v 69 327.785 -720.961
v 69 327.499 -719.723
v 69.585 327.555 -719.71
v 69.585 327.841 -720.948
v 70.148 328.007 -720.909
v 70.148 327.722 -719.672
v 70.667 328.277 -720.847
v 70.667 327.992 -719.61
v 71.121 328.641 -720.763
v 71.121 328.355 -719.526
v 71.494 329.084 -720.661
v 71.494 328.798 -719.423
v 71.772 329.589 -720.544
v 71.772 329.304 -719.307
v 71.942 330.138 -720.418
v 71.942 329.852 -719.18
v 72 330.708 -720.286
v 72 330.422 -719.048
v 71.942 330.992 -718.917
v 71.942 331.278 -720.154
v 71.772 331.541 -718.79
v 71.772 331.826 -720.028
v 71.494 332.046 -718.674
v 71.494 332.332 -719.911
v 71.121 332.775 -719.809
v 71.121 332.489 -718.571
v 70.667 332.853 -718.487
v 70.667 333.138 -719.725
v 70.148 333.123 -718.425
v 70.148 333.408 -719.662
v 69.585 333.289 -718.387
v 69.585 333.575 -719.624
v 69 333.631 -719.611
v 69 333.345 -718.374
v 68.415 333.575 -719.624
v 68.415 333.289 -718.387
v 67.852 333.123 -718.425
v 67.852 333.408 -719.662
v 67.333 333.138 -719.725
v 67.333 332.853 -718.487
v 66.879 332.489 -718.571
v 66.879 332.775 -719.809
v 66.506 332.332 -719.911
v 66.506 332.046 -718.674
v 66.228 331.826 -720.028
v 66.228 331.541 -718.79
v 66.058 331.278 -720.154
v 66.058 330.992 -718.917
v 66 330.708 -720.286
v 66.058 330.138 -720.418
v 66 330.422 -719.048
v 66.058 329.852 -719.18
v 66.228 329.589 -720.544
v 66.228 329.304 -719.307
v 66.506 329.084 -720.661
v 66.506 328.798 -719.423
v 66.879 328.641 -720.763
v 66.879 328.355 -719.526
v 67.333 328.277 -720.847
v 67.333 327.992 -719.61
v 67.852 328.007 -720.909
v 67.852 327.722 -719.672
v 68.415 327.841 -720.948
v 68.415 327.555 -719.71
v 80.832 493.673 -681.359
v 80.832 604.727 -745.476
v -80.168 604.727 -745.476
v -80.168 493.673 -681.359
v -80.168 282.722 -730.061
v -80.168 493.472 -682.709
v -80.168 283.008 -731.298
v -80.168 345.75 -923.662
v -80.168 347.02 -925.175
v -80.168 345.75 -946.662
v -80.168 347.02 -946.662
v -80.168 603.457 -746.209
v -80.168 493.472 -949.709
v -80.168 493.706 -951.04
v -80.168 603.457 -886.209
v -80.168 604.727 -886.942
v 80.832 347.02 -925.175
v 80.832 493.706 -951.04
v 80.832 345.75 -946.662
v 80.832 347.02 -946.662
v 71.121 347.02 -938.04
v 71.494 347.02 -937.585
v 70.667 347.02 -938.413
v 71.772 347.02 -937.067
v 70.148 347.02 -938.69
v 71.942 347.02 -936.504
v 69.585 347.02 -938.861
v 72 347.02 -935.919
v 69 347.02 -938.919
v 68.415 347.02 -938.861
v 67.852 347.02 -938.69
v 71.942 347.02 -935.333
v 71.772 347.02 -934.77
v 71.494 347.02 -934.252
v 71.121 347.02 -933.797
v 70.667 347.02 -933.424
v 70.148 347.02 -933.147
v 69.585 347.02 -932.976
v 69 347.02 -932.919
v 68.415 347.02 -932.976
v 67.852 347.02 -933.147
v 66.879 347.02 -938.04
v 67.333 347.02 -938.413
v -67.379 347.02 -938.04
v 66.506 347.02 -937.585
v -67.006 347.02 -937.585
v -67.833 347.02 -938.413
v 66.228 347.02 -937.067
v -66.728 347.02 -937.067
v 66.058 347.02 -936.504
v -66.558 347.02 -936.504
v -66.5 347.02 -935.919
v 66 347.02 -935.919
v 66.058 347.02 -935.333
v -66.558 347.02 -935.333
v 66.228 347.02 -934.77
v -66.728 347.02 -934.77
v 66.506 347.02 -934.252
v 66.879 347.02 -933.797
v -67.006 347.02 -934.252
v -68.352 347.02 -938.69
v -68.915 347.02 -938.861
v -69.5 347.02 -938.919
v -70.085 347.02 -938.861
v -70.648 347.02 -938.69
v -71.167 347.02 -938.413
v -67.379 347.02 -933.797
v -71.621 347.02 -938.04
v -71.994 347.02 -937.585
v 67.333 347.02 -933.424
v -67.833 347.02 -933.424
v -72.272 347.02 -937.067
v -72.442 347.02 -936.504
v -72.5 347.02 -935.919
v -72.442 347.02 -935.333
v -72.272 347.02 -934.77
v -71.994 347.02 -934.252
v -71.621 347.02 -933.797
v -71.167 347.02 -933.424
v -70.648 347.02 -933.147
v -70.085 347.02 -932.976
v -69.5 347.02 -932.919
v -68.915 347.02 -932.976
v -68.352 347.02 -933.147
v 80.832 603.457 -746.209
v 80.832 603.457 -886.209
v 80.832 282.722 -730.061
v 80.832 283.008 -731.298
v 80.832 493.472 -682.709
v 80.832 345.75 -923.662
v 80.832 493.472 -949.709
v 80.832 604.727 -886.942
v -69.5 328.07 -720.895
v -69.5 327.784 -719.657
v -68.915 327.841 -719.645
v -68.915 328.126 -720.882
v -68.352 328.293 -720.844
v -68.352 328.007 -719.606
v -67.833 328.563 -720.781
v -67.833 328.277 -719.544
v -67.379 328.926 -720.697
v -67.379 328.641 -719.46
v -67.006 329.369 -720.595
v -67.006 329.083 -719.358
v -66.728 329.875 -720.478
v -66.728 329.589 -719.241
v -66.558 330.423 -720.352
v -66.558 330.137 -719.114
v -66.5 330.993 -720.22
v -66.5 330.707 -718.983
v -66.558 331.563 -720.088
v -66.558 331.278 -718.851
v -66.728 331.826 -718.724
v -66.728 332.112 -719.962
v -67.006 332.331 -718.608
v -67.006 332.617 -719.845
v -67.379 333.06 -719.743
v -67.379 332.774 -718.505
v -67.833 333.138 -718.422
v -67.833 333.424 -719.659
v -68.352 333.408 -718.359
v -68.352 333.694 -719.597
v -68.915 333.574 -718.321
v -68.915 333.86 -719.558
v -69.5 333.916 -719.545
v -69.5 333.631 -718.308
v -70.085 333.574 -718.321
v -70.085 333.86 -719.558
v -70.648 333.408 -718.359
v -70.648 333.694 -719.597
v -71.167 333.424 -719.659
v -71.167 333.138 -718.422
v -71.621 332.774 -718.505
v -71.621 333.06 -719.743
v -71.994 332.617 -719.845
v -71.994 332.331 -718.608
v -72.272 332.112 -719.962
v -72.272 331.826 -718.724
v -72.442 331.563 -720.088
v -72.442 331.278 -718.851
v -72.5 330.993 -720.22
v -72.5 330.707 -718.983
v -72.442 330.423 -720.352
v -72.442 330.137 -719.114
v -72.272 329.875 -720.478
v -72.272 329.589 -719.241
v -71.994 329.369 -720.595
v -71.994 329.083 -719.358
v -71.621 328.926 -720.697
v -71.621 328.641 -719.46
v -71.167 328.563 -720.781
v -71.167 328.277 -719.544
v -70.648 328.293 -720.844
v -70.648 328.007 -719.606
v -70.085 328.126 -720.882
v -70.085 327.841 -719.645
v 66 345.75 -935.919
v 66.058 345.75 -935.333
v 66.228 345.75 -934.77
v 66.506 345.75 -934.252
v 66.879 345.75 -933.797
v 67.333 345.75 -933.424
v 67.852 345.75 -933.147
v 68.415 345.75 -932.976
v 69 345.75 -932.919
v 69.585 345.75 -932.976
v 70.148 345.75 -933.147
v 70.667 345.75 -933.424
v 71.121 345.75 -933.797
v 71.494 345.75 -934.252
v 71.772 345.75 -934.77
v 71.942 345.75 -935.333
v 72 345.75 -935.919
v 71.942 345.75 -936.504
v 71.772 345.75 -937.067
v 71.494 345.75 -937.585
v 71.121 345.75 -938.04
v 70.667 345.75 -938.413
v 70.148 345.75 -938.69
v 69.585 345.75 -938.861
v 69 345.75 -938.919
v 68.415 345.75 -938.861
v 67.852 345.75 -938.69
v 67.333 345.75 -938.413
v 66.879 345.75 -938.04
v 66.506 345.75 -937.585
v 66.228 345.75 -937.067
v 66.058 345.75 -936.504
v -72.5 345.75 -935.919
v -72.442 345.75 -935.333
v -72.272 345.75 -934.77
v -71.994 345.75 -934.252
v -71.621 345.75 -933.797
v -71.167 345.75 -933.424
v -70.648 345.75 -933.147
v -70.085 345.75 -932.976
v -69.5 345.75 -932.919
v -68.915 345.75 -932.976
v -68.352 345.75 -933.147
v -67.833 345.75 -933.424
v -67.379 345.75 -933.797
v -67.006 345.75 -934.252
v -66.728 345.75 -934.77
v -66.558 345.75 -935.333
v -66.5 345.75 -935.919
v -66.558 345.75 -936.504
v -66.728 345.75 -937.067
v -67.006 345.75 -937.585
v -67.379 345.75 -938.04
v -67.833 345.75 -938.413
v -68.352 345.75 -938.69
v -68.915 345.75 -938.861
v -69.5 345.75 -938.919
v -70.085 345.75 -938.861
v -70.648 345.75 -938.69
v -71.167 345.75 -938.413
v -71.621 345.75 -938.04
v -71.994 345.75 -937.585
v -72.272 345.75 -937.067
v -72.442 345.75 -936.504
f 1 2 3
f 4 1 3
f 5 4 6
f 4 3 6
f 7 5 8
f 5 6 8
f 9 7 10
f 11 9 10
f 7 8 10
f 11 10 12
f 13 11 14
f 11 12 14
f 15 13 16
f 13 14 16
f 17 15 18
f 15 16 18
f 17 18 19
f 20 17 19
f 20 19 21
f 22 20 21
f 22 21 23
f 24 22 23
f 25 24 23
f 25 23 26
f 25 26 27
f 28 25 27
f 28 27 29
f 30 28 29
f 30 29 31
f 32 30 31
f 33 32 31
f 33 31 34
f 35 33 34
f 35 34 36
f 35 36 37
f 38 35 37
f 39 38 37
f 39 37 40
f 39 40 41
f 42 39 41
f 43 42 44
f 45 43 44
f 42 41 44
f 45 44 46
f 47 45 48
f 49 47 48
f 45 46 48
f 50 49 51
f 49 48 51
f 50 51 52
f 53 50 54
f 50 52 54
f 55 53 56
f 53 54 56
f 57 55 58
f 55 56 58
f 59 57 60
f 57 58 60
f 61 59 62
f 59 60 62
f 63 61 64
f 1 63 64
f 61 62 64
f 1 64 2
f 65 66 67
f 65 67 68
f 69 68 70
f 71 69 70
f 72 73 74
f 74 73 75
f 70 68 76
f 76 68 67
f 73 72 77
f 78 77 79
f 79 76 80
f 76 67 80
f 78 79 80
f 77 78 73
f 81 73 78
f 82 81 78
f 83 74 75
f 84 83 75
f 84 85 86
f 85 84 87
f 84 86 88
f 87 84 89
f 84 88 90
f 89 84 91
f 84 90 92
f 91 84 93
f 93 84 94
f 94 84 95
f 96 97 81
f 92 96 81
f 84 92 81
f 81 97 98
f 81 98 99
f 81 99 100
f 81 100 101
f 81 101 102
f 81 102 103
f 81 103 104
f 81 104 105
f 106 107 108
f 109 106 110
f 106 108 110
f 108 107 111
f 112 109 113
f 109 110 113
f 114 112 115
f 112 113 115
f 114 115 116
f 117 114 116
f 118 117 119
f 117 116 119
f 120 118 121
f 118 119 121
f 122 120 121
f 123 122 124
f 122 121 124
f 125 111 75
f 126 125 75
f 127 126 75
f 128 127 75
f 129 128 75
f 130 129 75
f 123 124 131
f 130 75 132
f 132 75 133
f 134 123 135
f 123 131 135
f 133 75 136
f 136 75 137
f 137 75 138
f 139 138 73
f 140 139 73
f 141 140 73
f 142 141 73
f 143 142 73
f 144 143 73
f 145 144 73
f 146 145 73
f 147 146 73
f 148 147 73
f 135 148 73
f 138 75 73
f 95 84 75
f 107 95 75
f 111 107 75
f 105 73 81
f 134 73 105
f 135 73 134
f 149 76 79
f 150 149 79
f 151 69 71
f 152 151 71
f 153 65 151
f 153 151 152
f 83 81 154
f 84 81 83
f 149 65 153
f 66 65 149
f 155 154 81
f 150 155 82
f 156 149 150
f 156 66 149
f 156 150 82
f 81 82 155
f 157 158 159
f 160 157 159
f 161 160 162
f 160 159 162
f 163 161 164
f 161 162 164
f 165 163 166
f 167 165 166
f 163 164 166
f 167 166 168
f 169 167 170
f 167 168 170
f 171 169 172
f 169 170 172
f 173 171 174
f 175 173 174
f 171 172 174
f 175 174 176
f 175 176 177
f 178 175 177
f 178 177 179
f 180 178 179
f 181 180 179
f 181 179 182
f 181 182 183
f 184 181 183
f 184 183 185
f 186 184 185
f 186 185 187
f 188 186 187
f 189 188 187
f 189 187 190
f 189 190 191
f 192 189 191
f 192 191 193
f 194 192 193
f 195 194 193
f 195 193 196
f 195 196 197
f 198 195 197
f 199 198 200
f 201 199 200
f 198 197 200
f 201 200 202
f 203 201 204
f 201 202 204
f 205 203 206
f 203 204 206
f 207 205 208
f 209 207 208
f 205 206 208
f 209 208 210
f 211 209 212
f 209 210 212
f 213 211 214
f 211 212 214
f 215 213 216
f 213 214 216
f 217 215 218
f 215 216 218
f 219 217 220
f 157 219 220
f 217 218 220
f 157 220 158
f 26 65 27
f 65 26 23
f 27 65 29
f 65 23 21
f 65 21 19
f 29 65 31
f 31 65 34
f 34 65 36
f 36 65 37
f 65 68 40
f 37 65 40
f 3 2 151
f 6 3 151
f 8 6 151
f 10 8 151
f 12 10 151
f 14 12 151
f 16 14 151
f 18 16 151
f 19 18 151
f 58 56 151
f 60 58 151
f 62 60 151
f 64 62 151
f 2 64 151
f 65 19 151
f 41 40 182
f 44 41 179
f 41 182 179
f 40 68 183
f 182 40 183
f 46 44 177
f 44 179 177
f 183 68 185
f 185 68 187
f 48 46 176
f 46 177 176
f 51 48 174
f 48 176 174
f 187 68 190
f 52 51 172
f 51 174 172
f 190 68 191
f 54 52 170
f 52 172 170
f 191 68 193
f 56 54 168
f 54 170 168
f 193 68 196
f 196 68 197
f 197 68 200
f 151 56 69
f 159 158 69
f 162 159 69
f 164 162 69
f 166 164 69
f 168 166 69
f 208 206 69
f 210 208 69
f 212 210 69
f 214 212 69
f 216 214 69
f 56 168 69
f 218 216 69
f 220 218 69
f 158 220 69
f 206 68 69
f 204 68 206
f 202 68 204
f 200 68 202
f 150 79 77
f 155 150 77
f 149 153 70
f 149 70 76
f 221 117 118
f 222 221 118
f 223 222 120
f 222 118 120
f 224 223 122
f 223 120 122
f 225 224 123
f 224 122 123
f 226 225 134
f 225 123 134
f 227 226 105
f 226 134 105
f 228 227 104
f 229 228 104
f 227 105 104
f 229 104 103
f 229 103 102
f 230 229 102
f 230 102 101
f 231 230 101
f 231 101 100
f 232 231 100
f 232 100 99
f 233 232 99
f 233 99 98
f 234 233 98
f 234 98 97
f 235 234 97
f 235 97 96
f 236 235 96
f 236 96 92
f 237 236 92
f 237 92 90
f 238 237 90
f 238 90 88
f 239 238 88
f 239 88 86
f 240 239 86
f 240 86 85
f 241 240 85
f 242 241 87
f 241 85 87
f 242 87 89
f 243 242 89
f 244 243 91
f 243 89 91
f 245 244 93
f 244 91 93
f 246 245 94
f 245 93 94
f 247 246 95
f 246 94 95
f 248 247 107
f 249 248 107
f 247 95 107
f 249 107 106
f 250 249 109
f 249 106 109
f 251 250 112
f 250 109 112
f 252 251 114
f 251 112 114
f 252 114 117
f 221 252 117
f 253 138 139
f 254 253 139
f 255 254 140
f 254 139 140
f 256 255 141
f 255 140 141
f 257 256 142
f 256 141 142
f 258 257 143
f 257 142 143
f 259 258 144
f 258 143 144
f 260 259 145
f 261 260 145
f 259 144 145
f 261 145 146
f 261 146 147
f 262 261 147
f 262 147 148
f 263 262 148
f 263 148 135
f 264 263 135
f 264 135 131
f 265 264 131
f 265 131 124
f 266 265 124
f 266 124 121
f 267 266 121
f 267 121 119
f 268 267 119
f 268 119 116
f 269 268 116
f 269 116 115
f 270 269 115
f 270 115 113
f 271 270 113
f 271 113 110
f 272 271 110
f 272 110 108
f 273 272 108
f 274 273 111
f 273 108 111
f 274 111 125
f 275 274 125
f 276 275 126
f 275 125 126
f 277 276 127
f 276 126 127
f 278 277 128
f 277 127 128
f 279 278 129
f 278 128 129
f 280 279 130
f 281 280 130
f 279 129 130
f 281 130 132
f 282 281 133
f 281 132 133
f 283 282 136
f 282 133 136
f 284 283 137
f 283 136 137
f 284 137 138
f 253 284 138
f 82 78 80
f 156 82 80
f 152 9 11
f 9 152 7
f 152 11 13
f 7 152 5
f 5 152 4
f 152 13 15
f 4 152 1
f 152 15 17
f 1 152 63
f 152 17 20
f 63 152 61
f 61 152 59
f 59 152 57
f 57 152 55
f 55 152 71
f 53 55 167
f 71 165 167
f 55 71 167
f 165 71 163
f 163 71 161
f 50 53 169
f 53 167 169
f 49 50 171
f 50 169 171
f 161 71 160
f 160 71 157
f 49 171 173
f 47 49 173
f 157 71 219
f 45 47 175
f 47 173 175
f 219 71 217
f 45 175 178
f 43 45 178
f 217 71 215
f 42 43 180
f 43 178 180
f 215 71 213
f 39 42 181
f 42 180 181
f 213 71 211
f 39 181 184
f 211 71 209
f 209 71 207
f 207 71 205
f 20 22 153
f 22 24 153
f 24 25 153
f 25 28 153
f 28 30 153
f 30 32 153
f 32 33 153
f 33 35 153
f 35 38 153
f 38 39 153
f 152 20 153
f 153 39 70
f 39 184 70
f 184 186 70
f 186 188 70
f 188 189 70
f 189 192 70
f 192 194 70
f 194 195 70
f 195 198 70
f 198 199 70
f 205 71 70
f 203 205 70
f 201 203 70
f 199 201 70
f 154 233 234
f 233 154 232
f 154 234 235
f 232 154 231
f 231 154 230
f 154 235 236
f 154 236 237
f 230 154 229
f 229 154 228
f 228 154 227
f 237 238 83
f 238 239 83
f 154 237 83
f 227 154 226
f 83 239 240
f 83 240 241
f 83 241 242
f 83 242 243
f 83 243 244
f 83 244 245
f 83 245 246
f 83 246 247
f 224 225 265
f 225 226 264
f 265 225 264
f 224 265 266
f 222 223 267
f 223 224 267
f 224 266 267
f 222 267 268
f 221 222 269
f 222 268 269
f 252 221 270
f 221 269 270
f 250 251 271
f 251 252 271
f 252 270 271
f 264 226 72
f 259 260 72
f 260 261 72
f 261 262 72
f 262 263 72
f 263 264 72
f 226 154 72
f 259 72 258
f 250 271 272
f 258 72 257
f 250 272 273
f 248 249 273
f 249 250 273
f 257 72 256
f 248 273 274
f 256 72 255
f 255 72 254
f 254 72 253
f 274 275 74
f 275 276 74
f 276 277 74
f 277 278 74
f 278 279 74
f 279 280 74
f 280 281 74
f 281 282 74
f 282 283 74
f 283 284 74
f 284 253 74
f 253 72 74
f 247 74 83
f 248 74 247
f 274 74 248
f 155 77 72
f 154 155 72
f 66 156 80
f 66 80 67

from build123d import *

# Parameters (mm, degrees)
BOSS_EXTRUDE1_DEPTH      = 97
BOSS_EXTRUDE1_DEPTH_BACK = 64
SKETCH6_R                = 3
CUT_EXTRUDE1_DEPTH       = 10
SKETCH8_R                = 3
CUT_EXTRUDE3_DEPTH       = 10


with BuildPart() as part:
    # Sketch3 → Boss-Extrude1 (new, two sides: drawn at the far end of the back side and taken through both)
    with BuildSketch(Plane(origin=(-16.16759993, 0, 0), x_dir=(0, 0, -1), z_dir=(1, 0, 0)).offset(-BOSS_EXTRUDE1_DEPTH_BACK)):
        Polygon((746.208968128, 603.456840762), (886.208968128, 603.456840762), (949.708968128, 493.471614481), (923.661741478, 345.75045153), (946.661741478, 345.75045153), (946.661741478, 347.02045153), (925.175268541, 347.02045153), (951.03994149, 493.706300996), (886.94220297, 604.726840762), (745.475733286, 604.726840762), (681.358982713, 493.673371154), (730.060945884, 282.721992649), (731.298395866, 283.007680488), (682.708968128, 493.471614481), align=None)
    extrude(amount=BOSS_EXTRUDE1_DEPTH + BOSS_EXTRUDE1_DEPTH_BACK)

    # Sketch6 → Cut-Extrude1 (cut)
    with BuildSketch(Plane(origin=(0, 347.02045153, 0), x_dir=(1, 0, 0), z_dir=(0, 1, 0))):
        with Locations(Location((-69.5, 935.918505009, 0), (0, 0, 180))):
            Circle(SKETCH6_R)
        with Locations(Location((69.000000001, 935.918505009, 0), (0, 0, 180))):
            Circle(SKETCH6_R)
    extrude(amount=-CUT_EXTRUDE1_DEPTH, mode=Mode.SUBTRACT)

    # Sketch8 → Cut-Extrude3 (cut)
    with BuildSketch(Plane(origin=(0, 174.325401486, -755.08627081), x_dir=(1, 0, 0), z_dir=(0, -0.22495105434386187, 0.9743700647852359))):
        with Locations(Location((69, 160.202749263, 0), (0, 0, 270))):
            Circle(SKETCH8_R)
        with Locations(Location((-69.5, 160.49556469, 0), (0, 0, 270))):
            Circle(SKETCH8_R)
    extrude(amount=-CUT_EXTRUDE3_DEPTH, mode=Mode.SUBTRACT)


solid = part.part
